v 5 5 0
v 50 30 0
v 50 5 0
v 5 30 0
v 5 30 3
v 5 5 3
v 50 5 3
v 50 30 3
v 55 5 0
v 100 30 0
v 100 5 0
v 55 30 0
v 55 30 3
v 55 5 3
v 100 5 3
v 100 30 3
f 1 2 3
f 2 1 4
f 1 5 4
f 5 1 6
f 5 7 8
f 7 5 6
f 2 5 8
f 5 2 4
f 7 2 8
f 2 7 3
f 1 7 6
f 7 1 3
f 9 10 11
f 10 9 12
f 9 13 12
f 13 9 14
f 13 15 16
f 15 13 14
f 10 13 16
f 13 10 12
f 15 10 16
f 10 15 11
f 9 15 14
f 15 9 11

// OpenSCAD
// Deterministic sheet-layout helpers. Placement remains explicit because
// OpenSCAD cannot query arbitrary child bounds reliably.

/* [Output] */
make_3d = true; // [false:true]

/* [2D Layout] */
example_sheet_size = [120, 70];
example_margin = 5;
example_spacing = 5;

/* [Example] */
example_part_size = [45, 25];
example_thickness = 3;

/* [Hidden] */

cl_cut_layout_example(
    sheet_size=example_sheet_size,
    margin=example_margin,
    spacing=example_spacing,
    part_size=example_part_size,
    thickness=example_thickness,
    make_3d=make_3d);

module cl_cut_layout_example(sheet_size=[120, 70], margin=5, spacing=5,
                             part_size=[45, 25], thickness=3,
                             make_3d=false)
{
    positions = [[margin, margin],
                 [margin+part_size[0]+spacing, margin]];
    boxes = [[positions[0][0], positions[0][1],
              part_size[0], part_size[1]],
             [positions[1][0], positions[1][1],
              part_size[0], part_size[1]]];
    cl_validate_layout(boxes, sheet_size, margin, spacing, "example sheet");

    if (!make_3d)
        cl_sheet_boundary(sheet_size, "LAYOUT EXAMPLE");

    for (p = positions)
        translate([p[0], p[1], 0])
            if (make_3d)
                linear_extrude(height=thickness)
                    square(part_size);
            else
                square(part_size);
}

function cl_boxes_overlap(a, b, spacing=0) =
    !(a[0]+a[2]+spacing <= b[0] ||
      b[0]+b[2]+spacing <= a[0] ||
      a[1]+a[3]+spacing <= b[1] ||
      b[1]+b[3]+spacing <= a[1]);

module cl_validate_layout(boxes, sheet_size=[300,300],
                          margin=5, spacing=3, name="sheet")
{
    assert(sheet_size[0] > 2*margin && sheet_size[1] > 2*margin,
           str("cl_validate_layout: invalid ", name, " dimensions/margin"));

    for (i = [0:len(boxes)-1]) {
        b = boxes[i];
        assert(b[0] >= margin && b[1] >= margin &&
               b[0]+b[2] <= sheet_size[0]-margin &&
               b[1]+b[3] <= sheet_size[1]-margin,
               str("cl_validate_layout: part ", i,
                   " is outside ", name));

        if (i < len(boxes)-1)
            for (j = [i+1:len(boxes)-1])
                assert(!cl_boxes_overlap(b, boxes[j], spacing),
                       str("cl_validate_layout: parts ", i,
                           " and ", j, " overlap on ", name));
    }
}

module cl_sheet_boundary(sheet_size=[300,300], label="",
                         line_width=0.3)
{
    assert(sheet_size[0] > 0 && sheet_size[1] > 0,
           "cl_sheet_boundary: sheet size must be positive");

    %difference() {
        square(sheet_size);
        translate([line_width, line_width])
            square([sheet_size[0]-2*line_width,
                    sheet_size[1]-2*line_width]);
    }

    if (label != "")
        %translate([2, sheet_size[1]-5])
            text(label, size=3);
}

// Place a known-size part and optionally add a preview-only identifier.
module cl_layout_part(position, size, id="", quantity=1,
                      sheet_size=[300,300], margin=5,
                      label_size=2)
{
    assert(size[0] > 0 && size[1] > 0,
           str("cl_layout_part: ", id, " has non-positive size"));
    assert(position[0] >= margin && position[1] >= margin &&
           position[0]+size[0] <= sheet_size[0]-margin &&
           position[1]+size[1] <= sheet_size[1]-margin,
           str("cl_layout_part: ", id, " does not fit the sheet"));

    translate(position)
        children();

    if (id != "")
        %translate([position[0],
                    max(0.5, position[1]-label_size-0.5)])
            text(str(id, quantity > 1 ? str(" x", quantity) : ""),
                 size=label_size);
}

// Preview conventions for separating operations. Geometry is not altered.
module cl_cut_geometry()
{
    color("red")
        children();
}

module cl_engrave_geometry()
{
    color("blue")
        children();
}

module cl_reference_geometry()
{
    %color("gray")
        children();
}

// Select a manufacturing operation explicitly. Preview mode keeps both
// operations visible with conventional colours; exported cut/engrave modes
// contain only the requested geometry.
module cl_operation_geometry(kind="cut", output="preview")
{
    assert(kind == "cut" || kind == "engrave",
           "cl_operation_geometry: kind must be cut or engrave");
    assert(output == "cut" || output == "engrave" ||
           output == "preview",
           "cl_operation_geometry: unsupported output");

    if (output == kind)
        children();
    else if (output == "preview") {
        if (kind == "cut")
            cl_cut_geometry()
                children();
        else
            cl_engrave_geometry()
                children();
    }
}
